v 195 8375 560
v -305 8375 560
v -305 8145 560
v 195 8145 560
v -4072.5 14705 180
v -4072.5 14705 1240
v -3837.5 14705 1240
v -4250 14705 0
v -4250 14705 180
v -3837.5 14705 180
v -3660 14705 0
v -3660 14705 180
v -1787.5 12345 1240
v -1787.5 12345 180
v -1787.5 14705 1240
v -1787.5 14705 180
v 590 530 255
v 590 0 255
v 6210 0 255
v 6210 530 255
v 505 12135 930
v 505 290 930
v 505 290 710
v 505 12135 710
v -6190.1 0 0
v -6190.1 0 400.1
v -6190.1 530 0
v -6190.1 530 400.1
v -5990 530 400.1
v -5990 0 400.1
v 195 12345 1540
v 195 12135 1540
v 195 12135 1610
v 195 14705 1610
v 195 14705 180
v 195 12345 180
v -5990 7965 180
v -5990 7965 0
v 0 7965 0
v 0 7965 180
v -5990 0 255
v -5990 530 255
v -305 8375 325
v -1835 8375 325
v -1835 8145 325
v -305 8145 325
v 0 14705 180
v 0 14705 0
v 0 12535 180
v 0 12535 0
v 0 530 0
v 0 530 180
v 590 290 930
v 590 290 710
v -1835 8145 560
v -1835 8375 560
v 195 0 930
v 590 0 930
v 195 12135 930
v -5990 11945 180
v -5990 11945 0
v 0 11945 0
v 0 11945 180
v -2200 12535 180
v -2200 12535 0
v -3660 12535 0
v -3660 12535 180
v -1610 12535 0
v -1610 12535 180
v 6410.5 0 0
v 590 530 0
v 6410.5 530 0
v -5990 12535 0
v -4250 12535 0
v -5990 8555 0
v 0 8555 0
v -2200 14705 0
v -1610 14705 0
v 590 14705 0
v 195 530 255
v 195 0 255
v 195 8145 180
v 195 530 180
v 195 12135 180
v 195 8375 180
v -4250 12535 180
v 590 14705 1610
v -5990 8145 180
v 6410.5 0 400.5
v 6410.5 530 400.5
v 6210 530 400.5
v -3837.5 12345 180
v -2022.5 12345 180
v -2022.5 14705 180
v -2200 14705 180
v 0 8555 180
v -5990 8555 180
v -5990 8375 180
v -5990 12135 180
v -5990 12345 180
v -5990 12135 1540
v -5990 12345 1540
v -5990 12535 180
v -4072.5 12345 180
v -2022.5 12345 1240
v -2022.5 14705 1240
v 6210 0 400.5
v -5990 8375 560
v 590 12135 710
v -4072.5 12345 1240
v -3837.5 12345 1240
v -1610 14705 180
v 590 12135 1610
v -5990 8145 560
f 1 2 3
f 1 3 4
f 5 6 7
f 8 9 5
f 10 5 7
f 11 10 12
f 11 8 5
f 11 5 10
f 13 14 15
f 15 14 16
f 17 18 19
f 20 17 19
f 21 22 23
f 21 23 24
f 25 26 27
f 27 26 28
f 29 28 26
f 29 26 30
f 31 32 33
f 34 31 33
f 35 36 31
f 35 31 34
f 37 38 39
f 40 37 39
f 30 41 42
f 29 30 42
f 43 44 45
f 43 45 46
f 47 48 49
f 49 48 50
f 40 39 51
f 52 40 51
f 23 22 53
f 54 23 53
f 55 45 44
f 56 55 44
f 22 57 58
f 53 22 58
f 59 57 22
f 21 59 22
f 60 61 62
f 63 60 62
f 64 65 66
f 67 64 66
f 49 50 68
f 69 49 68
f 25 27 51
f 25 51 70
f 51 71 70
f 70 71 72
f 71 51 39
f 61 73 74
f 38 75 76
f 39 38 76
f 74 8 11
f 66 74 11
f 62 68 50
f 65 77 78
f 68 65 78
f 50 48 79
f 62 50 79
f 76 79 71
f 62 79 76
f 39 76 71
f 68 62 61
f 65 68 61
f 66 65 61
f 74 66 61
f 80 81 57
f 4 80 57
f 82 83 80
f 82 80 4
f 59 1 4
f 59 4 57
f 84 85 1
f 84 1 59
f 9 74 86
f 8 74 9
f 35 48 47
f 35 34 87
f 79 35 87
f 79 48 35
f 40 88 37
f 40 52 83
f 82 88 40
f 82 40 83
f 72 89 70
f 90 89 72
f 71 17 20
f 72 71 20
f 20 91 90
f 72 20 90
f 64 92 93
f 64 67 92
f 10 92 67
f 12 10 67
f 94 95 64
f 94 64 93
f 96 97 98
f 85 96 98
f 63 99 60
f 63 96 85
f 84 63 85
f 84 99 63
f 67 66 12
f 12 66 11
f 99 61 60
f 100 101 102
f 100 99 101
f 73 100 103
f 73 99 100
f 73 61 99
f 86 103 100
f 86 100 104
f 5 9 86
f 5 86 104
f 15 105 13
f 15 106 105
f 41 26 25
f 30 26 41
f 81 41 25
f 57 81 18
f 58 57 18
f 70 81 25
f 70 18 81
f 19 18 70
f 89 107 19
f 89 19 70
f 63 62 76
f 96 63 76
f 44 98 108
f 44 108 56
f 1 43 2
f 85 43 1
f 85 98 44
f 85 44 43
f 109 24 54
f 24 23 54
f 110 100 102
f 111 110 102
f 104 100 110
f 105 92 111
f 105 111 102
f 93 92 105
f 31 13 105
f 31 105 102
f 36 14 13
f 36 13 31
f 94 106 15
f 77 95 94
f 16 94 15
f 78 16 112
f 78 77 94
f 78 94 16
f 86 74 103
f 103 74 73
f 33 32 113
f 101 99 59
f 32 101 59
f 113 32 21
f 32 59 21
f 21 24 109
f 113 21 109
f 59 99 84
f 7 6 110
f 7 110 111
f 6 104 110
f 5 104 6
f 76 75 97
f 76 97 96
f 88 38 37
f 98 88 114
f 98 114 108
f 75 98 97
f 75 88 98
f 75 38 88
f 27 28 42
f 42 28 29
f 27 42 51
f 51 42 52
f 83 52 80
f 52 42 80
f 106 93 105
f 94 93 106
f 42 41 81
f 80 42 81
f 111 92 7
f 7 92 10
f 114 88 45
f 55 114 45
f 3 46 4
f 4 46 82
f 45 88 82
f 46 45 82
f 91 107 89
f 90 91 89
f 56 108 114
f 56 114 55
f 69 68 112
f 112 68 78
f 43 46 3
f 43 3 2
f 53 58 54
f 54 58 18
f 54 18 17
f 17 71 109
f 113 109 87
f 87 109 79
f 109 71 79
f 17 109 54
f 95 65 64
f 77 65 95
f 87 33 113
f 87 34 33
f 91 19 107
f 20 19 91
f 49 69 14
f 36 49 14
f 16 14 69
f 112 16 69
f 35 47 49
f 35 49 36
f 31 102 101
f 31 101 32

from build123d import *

# Parameters (mm, degrees)
F0_W           = 5990
F0_H           = 590
F0_W_2         = 590
F0_H_2         = 2170
F1_DEPTH       = 180
F2_W           = 395
F2_H           = 14705
F3_DEPTH       = 750
F4_W           = 395
F4_H           = 2570
F5_DEPTH       = 680
F6_W           = 85
F6_H           = 11845
F7_DEPTH       = 220
F8_W           = 6185
F8_H           = 230
F9_DEPTH       = 380
F10_W          = 1530
F10_H          = 230
F11_DEPTH      = 235
F12_W          = 6185
F12_H          = 210
F13_DEPTH      = 1060
F14_W          = 235
F14_H          = 2360
F15_DEPTH      = 1060
F16_W          = 12199.99962
F16_H          = 530
F17_DEPTH      = 255
F18_W          = 85
F18_H          = 900
F19_DEPTH      = 2570.001
F20_W          = 6185
F20_H          = 210
F21_DEPTH      = 300
F22_W          = 85
F22_H          = 2570
F23_DEPTH      = 900
F24_W          = 200.1
F24_H          = 530
F25_DEPTH      = 145.1
F25_DEPTH_BACK = 255
F26_W          = 200.5
F26_H          = 530
F27_DEPTH      = 145.5
F27_DEPTH_BACK = 255


# Not quite as in the source:
# - a feature names something its author has since deleted; it is built from what else it names


with BuildPart() as f1:
    # F0 (on Top) → F1 (new body)
    with BuildSketch(Plane.XY):
        Polygon((0, 7965), (0, 0), (590, 0), (590, 14705), (0, 14705), (0, 12535), (0, 11945), (0, 8555), align=None)
        with Locations((-2995, 8260)):
            Rectangle(F0_W, F0_H)
        Polygon((-5990, 11945), (0, 11945), (0, 12535), (-1610, 12535), (-2200, 12535), (-3660, 12535), (-4250, 12535), (-5990, 12535), align=None)
        with Locations((-3955, 13620)):
            Rectangle(F0_W_2, F0_H_2)
        with Locations((-1905, 13620)):
            Rectangle(F0_W_2, F0_H_2)
    extrude(amount=F1_DEPTH)

    # F2 (on face) → F3 (join)
    with BuildSketch(Plane.XY.offset(180)):
        with Locations((392.5, 7352.5)):
            Rectangle(F2_W, F2_H)
    extrude(amount=F3_DEPTH)

    # F4 (on face) → F5 (join)
    with BuildSketch(Plane.XY.offset(930)):
        with Locations((392.5, 13420)):
            Rectangle(F4_W, F4_H)
    extrude(amount=F5_DEPTH)

    # F6 (on face) → F7 (cut)
    with BuildSketch(Plane.XY.offset(930)):
        with Locations((547.5, 6212.5)):
            Rectangle(F6_W, F6_H)
    extrude(amount=-F7_DEPTH, mode=Mode.SUBTRACT)

    # F8 (on face) → F9 (join)
    with BuildSketch(Plane.XY.offset(180)):
        with Locations((-2897.5, 8260)):
            Rectangle(F8_W, F8_H)
    extrude(amount=F9_DEPTH)

    # F10 (on face) → F11 (cut)
    with BuildSketch(Plane.XY.offset(560)):
        with Locations((-1070, 8260)):
            Rectangle(F10_W, F10_H)
    extrude(amount=-F11_DEPTH, mode=Mode.SUBTRACT)

    # F12 (on face) → F13 (join)
    with BuildSketch(Plane.XY.offset(180)):
        with Locations((-2897.5, 12240)):
            Rectangle(F12_W, F12_H)
    extrude(amount=F13_DEPTH)

    # F14 (on face) → F15 (join, through all)
    with BuildSketch(Plane.XY.offset(180)):
        with Locations((-3955, 13525)):
            Rectangle(F14_W, F14_H)
        with Locations((-1905, 13525)):
            Rectangle(F14_W, F14_H)
    extrude(amount=F15_DEPTH)

    # F16 (on face) → F17 (join)
    with BuildSketch(Plane(origin=(0, 0, 0), x_dir=(1, 0, 0), z_dir=(0, 0, -1))):
        with Locations((109.99981, -265)):
            Rectangle(F16_W, F16_H)
    extrude(amount=-F17_DEPTH)

    # F18 (on face) → F19 (cut, through all)
    with BuildSketch(Plane.XZ.offset(-12135)):
        with Locations((547.5, 1160)):
            Rectangle(F18_W, F18_H)
    extrude(amount=-F19_DEPTH, mode=Mode.SUBTRACT)

    # F20 (on face) → F21 (join)
    with BuildSketch(Plane.XY.offset(1240)):
        with Locations((-2897.5, 12240)):
            Rectangle(F20_W, F20_H)
    extrude(amount=F21_DEPTH)

    # F22 (on face) → F23 (join, through all)
    with BuildSketch(Plane.XY.offset(710)):
        with Locations((547.5, 13420)):
            Rectangle(F22_W, F22_H)
    extrude(amount=F23_DEPTH)

    # F24 (on face) → F25 (join, two sides)
    with BuildSketch(Plane.XY.offset(255)) as f25_sk:
        with Locations((-6090.05, 265)):
            Rectangle(F24_W, F24_H)
    extrude(amount=F25_DEPTH)
    extrude(f25_sk.sketch, amount=-F25_DEPTH_BACK)

    # F26 (on face) → F27 (join, two sides)
    with BuildSketch(Plane.XY.offset(255)) as f27_sk:
        with Locations((6310.24962, 265)):
            Rectangle(F26_W, F26_H)
    extrude(amount=F27_DEPTH)
    extrude(f27_sk.sketch, amount=-F27_DEPTH_BACK)


solid = f1.part
